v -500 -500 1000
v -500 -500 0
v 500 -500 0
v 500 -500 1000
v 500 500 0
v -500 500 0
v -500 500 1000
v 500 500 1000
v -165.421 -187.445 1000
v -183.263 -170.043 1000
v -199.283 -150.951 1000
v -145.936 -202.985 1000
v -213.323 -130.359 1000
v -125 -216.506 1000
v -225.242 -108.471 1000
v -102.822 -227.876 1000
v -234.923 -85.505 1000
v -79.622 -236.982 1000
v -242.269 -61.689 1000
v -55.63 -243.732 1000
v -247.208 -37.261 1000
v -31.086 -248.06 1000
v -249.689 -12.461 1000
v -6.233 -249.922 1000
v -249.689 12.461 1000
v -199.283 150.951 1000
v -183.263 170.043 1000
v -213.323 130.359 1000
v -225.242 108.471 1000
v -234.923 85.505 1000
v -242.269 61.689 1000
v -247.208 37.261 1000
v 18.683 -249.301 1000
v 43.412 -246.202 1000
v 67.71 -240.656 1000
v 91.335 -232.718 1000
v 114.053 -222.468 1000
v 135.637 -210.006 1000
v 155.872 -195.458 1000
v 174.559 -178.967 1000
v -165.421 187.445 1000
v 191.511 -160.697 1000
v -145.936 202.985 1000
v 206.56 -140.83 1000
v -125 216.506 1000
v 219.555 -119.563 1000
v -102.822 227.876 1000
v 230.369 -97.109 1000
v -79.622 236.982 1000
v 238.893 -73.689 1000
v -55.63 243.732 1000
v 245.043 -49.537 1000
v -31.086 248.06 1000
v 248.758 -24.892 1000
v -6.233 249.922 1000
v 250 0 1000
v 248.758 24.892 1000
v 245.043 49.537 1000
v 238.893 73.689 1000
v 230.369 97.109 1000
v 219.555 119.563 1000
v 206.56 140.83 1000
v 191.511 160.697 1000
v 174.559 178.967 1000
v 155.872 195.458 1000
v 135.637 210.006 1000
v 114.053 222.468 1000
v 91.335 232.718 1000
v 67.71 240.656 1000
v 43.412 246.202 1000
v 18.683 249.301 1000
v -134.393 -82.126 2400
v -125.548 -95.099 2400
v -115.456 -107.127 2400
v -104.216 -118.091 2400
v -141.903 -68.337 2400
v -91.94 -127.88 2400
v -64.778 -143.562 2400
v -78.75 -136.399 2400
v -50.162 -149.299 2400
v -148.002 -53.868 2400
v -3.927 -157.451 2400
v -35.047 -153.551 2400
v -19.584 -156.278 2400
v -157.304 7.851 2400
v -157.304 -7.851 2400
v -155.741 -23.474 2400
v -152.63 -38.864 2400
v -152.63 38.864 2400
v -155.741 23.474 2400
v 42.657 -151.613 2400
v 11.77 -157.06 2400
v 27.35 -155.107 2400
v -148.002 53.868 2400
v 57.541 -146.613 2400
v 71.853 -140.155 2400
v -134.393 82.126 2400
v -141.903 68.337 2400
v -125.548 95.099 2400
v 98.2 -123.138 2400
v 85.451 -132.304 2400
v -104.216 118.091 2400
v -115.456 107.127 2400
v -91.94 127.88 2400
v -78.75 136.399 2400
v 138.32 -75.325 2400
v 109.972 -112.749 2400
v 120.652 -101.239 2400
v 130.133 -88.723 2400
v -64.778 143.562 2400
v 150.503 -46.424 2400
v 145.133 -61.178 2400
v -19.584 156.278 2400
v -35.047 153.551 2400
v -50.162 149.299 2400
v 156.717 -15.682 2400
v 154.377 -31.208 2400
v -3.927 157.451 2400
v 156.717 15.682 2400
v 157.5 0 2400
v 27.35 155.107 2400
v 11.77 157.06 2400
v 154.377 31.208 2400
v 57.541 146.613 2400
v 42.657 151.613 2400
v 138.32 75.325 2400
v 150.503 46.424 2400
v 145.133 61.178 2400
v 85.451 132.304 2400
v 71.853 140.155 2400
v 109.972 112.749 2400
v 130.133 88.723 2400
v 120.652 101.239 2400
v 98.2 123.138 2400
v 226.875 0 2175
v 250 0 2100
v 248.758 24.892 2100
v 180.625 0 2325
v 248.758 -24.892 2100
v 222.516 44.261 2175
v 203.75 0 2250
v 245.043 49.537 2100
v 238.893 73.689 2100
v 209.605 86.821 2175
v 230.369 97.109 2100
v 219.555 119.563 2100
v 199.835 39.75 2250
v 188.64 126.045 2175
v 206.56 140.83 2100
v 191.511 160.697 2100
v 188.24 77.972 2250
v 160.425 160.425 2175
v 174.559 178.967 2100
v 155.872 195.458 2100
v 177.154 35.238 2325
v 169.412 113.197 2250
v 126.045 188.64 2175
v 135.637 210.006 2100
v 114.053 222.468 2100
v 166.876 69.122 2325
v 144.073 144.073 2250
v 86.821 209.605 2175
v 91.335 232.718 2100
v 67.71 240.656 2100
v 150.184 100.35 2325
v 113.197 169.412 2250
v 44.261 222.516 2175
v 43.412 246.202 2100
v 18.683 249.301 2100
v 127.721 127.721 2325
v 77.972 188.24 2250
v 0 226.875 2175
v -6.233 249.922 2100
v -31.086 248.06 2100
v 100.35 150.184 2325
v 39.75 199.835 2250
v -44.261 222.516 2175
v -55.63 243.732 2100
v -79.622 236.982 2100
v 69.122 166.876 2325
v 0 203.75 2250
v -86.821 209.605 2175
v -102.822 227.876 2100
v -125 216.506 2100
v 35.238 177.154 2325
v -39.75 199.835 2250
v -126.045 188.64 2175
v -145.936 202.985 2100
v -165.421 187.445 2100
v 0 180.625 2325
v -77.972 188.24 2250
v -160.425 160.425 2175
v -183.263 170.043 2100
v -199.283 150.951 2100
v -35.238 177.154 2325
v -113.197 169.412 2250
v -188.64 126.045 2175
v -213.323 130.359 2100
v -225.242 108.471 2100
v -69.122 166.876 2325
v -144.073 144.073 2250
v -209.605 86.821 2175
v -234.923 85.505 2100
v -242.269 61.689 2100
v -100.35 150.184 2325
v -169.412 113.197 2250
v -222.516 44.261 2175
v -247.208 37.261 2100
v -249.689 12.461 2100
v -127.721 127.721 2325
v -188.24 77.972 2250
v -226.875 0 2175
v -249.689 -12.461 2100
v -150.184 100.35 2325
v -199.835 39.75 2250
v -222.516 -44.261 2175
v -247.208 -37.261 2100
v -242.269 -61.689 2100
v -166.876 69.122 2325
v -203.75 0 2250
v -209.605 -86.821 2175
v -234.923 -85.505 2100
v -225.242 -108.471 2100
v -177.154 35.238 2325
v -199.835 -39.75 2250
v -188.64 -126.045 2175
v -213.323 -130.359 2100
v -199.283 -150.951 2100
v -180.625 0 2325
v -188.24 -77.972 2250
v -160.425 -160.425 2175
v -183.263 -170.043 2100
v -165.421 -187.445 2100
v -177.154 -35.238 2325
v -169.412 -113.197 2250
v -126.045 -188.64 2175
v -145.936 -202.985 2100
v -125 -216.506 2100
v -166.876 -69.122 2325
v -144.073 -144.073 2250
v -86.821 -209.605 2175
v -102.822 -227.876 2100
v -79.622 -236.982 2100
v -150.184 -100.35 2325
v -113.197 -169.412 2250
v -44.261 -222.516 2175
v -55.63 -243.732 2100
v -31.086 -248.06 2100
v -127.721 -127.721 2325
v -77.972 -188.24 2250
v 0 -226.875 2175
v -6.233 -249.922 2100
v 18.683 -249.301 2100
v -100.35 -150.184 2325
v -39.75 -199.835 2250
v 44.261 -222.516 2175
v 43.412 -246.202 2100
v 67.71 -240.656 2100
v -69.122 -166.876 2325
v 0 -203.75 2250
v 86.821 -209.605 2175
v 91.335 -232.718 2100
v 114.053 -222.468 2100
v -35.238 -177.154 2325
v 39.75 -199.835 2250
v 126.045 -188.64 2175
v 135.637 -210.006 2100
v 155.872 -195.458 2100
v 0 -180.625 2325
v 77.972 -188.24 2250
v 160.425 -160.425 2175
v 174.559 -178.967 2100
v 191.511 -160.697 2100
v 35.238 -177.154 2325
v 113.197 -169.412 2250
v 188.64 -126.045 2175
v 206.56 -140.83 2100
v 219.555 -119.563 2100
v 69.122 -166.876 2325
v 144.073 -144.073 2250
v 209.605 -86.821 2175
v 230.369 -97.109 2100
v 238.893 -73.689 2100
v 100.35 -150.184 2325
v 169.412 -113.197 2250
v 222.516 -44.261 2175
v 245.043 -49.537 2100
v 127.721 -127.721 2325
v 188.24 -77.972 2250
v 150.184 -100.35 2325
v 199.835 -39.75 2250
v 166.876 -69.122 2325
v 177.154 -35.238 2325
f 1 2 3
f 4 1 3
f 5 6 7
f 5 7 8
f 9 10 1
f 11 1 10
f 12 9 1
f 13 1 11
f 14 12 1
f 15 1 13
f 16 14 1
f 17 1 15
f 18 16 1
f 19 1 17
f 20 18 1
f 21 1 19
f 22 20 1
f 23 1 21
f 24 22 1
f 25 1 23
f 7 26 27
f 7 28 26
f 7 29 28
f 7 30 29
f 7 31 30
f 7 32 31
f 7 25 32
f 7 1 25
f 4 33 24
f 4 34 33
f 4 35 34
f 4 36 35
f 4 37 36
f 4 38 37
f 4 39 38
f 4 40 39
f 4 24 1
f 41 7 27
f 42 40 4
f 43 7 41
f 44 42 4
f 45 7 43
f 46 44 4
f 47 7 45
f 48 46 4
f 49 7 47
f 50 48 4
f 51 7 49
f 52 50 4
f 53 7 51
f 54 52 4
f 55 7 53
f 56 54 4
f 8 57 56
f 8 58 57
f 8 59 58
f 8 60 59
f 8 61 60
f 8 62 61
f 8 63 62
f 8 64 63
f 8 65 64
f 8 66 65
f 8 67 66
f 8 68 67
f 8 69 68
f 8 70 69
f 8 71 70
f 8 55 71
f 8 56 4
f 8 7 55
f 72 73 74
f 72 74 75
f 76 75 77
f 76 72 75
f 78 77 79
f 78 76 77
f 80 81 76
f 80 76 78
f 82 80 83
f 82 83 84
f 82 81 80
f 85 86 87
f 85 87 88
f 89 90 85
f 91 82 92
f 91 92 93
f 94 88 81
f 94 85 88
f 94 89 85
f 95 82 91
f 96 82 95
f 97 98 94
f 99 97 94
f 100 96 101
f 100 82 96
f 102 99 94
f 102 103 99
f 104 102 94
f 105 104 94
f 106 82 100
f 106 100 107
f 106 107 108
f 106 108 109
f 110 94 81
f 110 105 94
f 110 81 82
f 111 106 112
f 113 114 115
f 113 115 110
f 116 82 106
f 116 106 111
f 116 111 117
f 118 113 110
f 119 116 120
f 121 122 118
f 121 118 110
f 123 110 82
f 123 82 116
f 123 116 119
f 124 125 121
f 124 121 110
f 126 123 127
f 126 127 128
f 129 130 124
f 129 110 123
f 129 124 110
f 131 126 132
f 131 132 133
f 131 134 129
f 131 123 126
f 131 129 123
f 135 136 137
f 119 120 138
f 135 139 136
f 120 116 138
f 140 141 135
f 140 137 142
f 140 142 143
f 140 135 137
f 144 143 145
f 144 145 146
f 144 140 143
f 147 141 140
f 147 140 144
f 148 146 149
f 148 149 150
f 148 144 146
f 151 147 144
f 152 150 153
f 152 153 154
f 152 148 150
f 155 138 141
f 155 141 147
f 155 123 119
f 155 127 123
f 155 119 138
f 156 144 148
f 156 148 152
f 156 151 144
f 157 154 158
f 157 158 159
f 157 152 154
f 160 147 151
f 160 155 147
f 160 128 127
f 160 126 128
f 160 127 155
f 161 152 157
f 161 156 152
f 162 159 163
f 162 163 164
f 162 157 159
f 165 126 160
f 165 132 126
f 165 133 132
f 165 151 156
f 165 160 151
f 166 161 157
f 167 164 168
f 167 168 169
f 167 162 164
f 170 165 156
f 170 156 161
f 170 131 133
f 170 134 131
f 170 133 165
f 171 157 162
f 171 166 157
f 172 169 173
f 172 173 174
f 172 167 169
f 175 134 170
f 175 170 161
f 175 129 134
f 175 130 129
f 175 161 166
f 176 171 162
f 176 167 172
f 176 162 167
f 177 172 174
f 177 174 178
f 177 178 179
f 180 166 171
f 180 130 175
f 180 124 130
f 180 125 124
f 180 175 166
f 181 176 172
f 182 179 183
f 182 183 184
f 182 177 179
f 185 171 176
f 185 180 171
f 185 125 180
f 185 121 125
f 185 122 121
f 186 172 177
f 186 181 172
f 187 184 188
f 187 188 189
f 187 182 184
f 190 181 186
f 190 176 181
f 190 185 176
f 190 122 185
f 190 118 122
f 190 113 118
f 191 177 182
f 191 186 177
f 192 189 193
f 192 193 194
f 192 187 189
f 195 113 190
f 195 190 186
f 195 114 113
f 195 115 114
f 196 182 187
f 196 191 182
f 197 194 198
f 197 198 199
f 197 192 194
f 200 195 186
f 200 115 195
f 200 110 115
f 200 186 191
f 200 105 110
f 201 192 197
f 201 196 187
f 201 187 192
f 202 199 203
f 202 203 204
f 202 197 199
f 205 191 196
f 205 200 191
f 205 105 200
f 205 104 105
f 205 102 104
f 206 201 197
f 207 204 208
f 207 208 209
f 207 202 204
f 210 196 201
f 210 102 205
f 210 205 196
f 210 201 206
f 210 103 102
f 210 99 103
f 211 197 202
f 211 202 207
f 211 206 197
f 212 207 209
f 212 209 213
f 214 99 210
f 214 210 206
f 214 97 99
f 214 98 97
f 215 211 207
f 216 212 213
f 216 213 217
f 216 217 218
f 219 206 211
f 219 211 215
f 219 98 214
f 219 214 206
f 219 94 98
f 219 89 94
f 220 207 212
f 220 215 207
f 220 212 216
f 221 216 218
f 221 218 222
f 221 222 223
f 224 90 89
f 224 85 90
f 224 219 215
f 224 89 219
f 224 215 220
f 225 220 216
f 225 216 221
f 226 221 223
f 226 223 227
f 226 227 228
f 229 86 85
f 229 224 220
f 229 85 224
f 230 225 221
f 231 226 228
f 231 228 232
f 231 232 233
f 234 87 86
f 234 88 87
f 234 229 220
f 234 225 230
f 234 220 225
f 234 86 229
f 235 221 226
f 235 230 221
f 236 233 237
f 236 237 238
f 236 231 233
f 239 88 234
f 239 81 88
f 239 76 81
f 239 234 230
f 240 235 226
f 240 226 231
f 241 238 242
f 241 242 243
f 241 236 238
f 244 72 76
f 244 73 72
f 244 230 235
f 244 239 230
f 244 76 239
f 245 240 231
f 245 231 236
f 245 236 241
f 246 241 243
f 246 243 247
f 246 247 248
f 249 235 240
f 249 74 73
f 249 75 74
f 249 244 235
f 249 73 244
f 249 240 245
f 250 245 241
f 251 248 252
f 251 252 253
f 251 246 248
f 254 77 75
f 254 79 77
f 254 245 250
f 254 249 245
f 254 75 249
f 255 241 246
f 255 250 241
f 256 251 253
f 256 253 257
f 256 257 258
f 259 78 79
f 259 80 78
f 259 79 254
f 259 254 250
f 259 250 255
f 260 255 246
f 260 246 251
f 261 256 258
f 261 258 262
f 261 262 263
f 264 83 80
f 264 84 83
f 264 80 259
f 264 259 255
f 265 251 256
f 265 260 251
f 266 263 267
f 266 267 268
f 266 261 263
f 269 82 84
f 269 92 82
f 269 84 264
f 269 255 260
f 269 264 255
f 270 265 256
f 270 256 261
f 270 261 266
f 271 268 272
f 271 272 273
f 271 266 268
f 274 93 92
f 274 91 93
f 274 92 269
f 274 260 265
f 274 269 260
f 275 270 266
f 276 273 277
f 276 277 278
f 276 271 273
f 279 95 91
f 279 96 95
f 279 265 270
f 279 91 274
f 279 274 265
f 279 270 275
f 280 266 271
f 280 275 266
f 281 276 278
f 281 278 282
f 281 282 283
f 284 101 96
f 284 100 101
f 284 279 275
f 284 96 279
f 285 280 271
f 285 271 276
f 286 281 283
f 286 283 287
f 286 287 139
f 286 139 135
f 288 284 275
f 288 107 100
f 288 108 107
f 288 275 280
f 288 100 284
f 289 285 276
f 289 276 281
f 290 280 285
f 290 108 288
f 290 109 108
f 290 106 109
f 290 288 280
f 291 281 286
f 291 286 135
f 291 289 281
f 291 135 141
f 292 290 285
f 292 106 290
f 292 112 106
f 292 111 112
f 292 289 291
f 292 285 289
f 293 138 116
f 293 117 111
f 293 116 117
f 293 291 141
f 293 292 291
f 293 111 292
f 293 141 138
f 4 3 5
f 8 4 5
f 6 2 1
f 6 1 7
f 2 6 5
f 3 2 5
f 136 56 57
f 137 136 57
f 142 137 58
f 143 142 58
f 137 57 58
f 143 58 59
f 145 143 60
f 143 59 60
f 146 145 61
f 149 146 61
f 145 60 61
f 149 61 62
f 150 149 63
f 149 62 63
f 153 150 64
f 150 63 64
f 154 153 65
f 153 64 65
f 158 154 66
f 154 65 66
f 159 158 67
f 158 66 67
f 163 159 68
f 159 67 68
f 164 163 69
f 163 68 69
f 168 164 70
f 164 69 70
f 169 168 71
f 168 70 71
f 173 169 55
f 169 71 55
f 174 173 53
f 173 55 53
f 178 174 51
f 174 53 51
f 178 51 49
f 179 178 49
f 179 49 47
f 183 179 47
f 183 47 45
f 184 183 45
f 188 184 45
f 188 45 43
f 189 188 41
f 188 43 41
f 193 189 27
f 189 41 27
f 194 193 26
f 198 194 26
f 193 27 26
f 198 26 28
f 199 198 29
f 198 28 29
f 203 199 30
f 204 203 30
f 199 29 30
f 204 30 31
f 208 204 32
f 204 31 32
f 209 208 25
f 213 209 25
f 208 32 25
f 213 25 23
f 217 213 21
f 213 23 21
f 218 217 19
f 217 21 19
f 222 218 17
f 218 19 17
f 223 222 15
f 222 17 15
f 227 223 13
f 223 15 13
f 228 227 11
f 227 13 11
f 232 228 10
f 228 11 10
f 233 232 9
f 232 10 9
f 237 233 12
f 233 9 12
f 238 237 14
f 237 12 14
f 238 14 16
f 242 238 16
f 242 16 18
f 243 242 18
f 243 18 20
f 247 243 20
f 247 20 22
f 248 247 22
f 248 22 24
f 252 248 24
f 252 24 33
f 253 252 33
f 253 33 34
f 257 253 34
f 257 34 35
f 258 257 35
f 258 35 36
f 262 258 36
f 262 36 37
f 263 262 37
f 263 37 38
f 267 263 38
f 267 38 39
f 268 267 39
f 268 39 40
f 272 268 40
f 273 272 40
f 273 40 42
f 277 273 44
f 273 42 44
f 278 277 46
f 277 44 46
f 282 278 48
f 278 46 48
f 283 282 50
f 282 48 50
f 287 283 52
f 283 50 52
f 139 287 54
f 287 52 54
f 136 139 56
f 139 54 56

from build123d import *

# Parameters (mm, degrees)
SKETCH_W     = 1000
SKETCH_H     = 1000
PAD_DEPTH    = 1000
SKETCH001_R  = 157.5
PAD001_DEPTH = 1300
SKETCH002_R  = 250
PAD002_DEPTH = 1100


with BuildPart() as part:
    # Sketch → Pad (new body)
    with BuildSketch(Plane.XY):
        Rectangle(SKETCH_W, SKETCH_H)
    extrude(amount=PAD_DEPTH)

    # Sketch001 (on Face6 of Pad) → Pad001 (join)
    with BuildSketch(Plane.XY.offset(1000)):
        Circle(SKETCH001_R)
    extrude(amount=PAD001_DEPTH)

    # Sketch002 (on Face5 of Pad001) → Pad002 (join)
    with BuildSketch(Plane.XY.offset(1000)):
        Circle(SKETCH002_R)
    extrude(amount=PAD002_DEPTH)

    # Sketch003 → Revolution (revolve)
    with BuildSketch(Plane.XZ):
        Polygon((0, 2100), (250, 2100), (157.5, 2400), (0, 2400), align=None)
    revolve(axis=Axis((0, 0, 0), (0, 0, 1)))


solid = part.part
